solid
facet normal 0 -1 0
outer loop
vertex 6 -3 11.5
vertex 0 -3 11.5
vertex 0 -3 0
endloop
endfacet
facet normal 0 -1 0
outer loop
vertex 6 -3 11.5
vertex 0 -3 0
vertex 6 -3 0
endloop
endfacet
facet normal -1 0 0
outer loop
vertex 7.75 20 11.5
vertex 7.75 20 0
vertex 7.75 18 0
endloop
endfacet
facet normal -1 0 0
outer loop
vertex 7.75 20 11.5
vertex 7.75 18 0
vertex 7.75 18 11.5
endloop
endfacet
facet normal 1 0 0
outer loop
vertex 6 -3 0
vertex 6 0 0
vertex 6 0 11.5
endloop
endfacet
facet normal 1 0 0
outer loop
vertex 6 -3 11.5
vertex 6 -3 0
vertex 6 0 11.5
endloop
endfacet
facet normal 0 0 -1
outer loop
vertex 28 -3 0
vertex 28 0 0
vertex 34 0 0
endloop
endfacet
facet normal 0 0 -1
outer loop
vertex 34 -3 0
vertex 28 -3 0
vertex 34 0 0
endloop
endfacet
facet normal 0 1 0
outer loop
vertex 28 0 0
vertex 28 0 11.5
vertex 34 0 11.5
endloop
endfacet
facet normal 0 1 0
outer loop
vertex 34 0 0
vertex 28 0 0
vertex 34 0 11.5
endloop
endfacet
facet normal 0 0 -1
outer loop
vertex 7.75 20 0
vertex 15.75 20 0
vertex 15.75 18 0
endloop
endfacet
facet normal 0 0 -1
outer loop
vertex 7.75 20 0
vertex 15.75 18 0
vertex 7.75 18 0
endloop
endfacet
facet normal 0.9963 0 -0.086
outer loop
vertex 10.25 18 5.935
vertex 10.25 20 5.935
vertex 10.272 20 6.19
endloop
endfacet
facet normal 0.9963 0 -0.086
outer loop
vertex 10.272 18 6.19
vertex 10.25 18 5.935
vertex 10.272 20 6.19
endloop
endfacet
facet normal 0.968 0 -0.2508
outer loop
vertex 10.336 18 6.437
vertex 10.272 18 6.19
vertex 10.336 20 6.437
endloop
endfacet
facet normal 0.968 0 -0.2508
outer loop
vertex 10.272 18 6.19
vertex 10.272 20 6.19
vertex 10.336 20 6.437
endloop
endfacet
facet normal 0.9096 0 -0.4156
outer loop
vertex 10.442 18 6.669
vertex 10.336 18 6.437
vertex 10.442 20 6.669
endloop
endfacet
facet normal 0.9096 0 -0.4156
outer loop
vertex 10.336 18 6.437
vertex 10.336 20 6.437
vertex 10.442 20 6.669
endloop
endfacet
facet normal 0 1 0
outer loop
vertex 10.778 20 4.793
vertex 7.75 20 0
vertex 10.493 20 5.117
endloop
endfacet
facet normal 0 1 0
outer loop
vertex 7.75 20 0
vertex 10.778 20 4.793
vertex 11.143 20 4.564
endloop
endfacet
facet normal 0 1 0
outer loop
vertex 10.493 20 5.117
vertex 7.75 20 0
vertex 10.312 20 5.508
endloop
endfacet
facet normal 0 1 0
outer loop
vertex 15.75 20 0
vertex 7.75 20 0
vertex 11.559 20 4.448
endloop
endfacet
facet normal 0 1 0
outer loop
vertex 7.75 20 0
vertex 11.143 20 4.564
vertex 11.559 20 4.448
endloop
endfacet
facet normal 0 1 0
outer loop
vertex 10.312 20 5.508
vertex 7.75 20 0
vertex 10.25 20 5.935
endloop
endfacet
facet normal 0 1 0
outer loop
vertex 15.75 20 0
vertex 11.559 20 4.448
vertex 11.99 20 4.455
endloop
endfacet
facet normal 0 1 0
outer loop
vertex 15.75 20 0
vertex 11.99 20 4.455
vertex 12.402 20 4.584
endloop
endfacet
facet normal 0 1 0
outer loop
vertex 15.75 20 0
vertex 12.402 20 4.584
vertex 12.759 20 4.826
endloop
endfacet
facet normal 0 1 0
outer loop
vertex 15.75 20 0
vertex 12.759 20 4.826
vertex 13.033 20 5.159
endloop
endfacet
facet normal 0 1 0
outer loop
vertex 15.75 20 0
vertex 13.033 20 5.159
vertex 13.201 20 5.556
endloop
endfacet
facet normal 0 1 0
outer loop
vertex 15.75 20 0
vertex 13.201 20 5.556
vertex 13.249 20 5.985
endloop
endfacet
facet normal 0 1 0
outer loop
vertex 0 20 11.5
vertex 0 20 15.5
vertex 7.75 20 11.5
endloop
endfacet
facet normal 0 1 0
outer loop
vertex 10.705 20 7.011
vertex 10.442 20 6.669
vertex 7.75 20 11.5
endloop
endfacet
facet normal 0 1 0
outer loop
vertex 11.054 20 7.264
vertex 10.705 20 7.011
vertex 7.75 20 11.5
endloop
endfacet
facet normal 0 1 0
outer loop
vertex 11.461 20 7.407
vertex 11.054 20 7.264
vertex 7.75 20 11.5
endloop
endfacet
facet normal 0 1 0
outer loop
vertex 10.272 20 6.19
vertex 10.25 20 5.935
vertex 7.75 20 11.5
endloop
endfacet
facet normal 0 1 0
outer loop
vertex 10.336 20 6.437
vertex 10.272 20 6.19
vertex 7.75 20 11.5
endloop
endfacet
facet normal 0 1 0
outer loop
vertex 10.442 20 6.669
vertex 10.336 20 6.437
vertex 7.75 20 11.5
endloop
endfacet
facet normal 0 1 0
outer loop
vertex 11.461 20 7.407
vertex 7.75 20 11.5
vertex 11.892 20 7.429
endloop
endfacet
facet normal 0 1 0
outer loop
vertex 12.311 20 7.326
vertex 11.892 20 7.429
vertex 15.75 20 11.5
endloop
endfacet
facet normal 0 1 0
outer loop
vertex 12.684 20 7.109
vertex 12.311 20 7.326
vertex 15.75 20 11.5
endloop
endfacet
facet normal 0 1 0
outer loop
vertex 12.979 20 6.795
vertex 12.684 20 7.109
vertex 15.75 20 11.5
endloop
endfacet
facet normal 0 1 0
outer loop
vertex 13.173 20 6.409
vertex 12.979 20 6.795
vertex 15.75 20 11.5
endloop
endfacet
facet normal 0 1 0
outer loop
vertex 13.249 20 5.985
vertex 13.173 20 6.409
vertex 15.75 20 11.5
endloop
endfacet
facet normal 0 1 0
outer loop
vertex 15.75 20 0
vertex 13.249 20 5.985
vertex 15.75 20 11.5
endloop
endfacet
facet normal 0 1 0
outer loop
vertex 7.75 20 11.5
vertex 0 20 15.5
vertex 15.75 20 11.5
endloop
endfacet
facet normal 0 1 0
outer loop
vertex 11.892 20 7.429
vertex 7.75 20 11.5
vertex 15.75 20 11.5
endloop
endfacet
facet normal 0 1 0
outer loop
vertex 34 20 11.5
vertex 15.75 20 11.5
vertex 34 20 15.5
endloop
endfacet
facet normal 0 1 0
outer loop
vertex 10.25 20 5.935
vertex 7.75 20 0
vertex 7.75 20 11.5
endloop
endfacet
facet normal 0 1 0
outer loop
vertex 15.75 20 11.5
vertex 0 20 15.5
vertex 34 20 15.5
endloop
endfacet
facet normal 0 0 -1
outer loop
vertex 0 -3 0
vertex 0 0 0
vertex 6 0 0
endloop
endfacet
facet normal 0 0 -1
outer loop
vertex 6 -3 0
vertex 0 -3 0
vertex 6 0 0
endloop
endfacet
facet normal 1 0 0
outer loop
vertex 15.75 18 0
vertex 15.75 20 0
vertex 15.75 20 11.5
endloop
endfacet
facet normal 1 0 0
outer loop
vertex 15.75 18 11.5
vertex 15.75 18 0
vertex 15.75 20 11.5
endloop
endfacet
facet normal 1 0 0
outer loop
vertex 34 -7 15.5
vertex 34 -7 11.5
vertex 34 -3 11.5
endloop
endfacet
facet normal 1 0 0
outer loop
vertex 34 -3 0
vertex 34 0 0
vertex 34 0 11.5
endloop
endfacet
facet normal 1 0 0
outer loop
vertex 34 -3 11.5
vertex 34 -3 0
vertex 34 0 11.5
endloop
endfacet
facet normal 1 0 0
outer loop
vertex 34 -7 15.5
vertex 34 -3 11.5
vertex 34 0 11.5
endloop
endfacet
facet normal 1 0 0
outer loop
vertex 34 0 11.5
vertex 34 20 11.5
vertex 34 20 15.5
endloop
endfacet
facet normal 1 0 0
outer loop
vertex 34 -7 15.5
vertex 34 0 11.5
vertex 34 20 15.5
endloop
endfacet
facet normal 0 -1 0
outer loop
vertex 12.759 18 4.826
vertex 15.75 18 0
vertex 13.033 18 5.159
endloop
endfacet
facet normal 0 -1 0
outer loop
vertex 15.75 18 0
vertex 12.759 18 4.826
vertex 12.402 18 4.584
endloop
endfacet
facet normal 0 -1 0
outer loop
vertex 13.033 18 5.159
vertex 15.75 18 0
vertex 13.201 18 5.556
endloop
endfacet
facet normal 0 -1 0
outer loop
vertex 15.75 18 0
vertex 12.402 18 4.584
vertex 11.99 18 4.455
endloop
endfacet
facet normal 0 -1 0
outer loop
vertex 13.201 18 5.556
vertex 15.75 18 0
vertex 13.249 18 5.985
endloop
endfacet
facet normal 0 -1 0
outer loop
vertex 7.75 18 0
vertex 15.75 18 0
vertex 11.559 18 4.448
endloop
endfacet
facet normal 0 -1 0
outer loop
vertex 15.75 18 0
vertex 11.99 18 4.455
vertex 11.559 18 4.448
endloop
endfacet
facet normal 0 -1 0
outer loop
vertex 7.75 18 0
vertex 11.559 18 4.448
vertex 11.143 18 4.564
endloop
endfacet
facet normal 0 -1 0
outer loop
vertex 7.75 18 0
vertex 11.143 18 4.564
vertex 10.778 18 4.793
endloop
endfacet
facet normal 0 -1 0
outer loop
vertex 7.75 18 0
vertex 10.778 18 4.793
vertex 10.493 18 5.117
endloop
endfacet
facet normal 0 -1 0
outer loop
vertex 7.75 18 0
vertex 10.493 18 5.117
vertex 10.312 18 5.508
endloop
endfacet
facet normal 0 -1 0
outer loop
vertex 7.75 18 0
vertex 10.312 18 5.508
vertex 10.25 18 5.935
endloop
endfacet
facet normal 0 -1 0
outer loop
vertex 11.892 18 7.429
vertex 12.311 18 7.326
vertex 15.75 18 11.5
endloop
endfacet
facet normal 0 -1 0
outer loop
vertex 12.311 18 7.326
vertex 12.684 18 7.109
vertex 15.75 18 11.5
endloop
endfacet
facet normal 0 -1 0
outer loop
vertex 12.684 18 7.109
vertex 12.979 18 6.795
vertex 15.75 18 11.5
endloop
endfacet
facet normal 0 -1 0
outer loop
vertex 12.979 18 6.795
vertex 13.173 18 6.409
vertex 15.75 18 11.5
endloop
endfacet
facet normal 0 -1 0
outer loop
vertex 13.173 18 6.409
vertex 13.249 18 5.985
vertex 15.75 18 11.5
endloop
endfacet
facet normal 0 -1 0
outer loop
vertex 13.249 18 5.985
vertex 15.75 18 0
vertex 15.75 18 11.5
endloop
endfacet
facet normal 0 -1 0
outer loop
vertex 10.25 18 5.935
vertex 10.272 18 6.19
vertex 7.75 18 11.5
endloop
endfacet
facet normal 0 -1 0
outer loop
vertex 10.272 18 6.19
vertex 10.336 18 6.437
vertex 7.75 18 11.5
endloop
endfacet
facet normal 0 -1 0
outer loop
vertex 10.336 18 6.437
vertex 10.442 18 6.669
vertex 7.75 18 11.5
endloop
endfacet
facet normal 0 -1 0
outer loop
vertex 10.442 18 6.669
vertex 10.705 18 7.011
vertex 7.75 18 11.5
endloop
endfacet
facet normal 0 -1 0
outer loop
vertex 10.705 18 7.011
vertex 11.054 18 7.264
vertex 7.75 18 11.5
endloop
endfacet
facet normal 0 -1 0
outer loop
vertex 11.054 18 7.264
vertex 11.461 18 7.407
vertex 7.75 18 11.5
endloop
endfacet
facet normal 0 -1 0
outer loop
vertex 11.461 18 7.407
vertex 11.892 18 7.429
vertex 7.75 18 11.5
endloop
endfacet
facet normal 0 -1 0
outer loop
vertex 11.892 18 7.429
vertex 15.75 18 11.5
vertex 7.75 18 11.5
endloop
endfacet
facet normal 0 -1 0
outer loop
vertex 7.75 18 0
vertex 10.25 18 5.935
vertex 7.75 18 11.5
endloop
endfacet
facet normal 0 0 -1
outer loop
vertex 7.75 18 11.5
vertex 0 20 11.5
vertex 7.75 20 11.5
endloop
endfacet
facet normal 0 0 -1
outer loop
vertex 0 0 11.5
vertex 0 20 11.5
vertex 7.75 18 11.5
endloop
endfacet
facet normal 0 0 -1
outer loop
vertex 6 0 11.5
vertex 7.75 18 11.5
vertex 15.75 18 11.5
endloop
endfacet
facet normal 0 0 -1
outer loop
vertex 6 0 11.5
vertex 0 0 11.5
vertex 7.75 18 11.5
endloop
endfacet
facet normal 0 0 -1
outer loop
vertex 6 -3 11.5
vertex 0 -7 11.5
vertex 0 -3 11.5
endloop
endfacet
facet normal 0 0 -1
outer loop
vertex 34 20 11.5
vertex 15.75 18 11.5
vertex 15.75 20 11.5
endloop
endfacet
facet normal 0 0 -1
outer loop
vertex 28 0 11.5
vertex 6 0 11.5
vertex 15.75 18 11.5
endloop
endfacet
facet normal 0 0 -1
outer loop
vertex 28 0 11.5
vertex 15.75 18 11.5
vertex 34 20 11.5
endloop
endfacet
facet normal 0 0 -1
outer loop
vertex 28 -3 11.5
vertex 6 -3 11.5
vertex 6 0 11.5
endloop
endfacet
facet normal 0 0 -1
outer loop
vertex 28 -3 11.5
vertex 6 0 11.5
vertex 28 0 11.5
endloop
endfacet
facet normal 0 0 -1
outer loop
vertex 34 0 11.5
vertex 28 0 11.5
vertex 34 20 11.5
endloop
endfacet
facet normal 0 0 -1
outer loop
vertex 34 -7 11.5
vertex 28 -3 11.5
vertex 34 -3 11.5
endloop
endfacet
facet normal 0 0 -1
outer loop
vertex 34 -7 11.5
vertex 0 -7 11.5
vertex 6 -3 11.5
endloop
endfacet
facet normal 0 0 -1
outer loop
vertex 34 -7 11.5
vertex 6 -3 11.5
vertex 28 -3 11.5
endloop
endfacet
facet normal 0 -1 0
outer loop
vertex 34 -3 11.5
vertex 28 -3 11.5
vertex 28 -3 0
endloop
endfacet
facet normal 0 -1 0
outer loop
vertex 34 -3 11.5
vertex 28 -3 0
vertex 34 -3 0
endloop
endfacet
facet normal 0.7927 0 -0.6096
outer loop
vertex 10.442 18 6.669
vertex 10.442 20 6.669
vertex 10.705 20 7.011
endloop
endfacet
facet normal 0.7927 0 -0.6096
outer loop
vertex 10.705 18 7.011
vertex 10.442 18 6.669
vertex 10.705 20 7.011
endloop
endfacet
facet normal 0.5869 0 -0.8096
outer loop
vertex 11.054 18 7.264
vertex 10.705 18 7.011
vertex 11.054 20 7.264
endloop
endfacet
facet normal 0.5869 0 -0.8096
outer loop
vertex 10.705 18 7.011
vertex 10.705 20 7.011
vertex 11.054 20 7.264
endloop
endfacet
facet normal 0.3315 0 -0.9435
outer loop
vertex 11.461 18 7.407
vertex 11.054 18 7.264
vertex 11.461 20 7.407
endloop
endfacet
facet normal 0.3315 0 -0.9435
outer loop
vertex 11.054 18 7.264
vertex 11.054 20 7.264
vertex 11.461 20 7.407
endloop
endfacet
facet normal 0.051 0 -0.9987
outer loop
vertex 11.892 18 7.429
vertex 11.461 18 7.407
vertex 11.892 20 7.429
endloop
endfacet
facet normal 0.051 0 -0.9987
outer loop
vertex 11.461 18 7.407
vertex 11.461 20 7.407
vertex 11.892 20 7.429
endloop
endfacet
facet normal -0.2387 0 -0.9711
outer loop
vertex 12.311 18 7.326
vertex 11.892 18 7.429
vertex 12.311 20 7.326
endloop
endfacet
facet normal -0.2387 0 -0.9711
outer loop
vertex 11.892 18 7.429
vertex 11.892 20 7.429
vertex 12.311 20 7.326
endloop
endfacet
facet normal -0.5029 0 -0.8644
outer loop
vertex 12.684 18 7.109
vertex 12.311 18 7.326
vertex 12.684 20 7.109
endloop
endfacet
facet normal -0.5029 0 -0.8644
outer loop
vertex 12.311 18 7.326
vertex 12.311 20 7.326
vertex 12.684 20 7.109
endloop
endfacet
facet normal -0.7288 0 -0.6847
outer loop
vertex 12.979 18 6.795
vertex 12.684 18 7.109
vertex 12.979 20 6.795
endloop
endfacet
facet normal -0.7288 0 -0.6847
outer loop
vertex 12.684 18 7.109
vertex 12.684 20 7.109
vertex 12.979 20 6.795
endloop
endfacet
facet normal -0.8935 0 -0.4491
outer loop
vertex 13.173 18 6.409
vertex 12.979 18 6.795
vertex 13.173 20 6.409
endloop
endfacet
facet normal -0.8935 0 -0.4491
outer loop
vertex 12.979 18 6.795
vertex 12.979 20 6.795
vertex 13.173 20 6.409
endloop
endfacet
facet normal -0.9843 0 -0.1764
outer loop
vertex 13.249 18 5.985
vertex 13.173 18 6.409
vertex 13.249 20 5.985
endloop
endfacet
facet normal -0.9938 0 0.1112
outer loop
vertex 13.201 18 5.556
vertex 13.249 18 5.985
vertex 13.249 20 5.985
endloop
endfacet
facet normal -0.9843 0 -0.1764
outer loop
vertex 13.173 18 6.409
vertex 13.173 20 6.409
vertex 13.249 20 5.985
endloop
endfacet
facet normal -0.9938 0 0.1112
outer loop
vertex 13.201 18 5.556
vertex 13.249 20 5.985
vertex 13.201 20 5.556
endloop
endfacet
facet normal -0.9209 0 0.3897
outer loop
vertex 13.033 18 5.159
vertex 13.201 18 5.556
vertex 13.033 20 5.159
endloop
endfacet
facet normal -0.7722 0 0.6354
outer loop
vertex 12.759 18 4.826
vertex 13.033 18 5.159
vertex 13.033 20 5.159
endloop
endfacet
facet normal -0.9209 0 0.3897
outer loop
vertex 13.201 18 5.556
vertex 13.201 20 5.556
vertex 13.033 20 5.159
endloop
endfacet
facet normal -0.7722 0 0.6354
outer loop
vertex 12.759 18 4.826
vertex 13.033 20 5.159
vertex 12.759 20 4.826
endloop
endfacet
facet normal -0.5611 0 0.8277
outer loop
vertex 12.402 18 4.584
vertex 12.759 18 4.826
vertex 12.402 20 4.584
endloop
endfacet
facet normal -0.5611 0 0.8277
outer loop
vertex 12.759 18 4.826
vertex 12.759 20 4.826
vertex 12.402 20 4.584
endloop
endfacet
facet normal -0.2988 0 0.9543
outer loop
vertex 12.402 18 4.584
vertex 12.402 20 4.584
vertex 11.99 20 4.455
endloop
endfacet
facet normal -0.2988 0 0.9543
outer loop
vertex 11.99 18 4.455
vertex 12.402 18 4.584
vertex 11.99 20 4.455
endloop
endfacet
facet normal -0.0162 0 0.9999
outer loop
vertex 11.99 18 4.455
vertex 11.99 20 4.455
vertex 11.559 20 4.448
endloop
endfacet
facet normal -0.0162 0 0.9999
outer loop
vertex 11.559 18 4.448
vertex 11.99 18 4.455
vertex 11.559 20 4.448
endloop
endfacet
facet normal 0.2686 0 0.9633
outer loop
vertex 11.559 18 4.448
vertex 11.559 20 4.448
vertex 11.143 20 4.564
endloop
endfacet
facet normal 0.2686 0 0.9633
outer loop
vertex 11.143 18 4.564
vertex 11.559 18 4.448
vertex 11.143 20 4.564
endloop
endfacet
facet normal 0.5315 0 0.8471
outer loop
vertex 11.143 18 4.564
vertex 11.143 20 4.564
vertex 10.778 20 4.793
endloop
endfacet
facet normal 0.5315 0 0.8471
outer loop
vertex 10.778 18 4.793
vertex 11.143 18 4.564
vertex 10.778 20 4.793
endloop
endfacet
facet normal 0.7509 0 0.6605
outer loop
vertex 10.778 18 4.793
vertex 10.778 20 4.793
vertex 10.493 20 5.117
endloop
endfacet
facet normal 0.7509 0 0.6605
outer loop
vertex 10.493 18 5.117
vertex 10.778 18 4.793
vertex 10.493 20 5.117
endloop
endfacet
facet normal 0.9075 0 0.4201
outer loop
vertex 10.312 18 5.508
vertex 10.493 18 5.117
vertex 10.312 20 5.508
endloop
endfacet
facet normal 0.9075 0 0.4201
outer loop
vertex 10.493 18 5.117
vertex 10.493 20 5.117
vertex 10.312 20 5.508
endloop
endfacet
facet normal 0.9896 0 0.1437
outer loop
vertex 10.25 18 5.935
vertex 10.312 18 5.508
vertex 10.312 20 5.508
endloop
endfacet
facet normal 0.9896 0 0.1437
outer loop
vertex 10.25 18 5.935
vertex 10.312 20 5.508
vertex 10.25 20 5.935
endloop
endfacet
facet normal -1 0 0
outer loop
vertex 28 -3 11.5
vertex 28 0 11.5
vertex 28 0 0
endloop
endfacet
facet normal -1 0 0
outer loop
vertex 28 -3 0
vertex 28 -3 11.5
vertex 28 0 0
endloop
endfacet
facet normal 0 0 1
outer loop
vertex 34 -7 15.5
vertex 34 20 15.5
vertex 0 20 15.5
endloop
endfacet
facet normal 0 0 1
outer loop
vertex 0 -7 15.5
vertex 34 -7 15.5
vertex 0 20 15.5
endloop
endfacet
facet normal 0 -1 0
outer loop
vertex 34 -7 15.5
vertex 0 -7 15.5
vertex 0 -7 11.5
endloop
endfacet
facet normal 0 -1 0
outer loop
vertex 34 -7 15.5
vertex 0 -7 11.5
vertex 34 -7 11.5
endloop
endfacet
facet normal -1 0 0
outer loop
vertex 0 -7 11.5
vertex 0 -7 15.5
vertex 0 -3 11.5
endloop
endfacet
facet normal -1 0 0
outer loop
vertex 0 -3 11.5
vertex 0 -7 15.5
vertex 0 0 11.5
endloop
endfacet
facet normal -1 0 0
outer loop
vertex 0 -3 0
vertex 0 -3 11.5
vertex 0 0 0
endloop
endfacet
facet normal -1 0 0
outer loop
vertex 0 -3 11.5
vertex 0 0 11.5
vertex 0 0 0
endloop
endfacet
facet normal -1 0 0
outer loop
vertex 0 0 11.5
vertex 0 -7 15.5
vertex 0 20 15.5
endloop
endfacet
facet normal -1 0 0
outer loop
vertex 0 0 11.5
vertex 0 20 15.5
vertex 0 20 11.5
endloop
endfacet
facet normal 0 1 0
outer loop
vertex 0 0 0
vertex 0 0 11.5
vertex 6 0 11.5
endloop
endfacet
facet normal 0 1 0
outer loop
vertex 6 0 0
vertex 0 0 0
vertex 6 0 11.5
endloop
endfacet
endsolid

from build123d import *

# Parameters (mm, degrees)
F1_DEPTH = 3
F3_DEPTH = 4
F2_W     = 34
F2_H     = 4
F4_DEPTH = 23
F5_W     = 8
F5_H     = 11.5
F6_DEPTH = 2
F8_DEPTH = 2


with BuildPart() as f1:
    # F0 (on Front) → F1 (new body)
    with BuildSketch(Plane.XZ):
        Polygon((0, 15.5), (0, 0), (6, 0), (6, 11.5), (28, 11.5), (28, 0), (34, 0), (34, 15.5), align=None)
    extrude(amount=F1_DEPTH)

    # F2 (on face) → F3 (join)
    with BuildSketch(Plane.XZ.offset(3)):
        Polygon((0, 15.5), (0, 11.5), (6, 11.5), (28, 11.5), (34, 11.5), (34, 15.5), align=None)
    extrude(amount=F3_DEPTH)

    # F2 (on face) → F4 (join)
    with BuildSketch(Plane.XZ.offset(3)):
        with Locations((17, 13.5)):
            Rectangle(F2_W, F2_H)
    extrude(amount=-F4_DEPTH)

    # F5 (on face) → F6 (join)
    with BuildSketch(Plane(origin=(0, 20, 0), x_dir=(-1, 0, 0), z_dir=(0, 1, 0))):
        with Locations((-11.75, 5.75)):
            Rectangle(F5_W, F5_H)
    extrude(amount=-F6_DEPTH)

    # F7 (on face) → F8 (cut, through all)
    with BuildSketch(Plane(origin=(0, 20, 0), x_dir=(-1, 0, 0), z_dir=(0, 1, 0))):
        with BuildLine():
            ThreePointArc((-10.25, 5.93532), (-10.298761, 6.31467), (-10.441875, 6.669356))
            ThreePointArc((-10.441875, 6.669356), (-13.201239, 5.55597), (-10.25, 5.93532))
        make_face()
    extrude(amount=-F8_DEPTH, mode=Mode.SUBTRACT)


solid = f1.part
